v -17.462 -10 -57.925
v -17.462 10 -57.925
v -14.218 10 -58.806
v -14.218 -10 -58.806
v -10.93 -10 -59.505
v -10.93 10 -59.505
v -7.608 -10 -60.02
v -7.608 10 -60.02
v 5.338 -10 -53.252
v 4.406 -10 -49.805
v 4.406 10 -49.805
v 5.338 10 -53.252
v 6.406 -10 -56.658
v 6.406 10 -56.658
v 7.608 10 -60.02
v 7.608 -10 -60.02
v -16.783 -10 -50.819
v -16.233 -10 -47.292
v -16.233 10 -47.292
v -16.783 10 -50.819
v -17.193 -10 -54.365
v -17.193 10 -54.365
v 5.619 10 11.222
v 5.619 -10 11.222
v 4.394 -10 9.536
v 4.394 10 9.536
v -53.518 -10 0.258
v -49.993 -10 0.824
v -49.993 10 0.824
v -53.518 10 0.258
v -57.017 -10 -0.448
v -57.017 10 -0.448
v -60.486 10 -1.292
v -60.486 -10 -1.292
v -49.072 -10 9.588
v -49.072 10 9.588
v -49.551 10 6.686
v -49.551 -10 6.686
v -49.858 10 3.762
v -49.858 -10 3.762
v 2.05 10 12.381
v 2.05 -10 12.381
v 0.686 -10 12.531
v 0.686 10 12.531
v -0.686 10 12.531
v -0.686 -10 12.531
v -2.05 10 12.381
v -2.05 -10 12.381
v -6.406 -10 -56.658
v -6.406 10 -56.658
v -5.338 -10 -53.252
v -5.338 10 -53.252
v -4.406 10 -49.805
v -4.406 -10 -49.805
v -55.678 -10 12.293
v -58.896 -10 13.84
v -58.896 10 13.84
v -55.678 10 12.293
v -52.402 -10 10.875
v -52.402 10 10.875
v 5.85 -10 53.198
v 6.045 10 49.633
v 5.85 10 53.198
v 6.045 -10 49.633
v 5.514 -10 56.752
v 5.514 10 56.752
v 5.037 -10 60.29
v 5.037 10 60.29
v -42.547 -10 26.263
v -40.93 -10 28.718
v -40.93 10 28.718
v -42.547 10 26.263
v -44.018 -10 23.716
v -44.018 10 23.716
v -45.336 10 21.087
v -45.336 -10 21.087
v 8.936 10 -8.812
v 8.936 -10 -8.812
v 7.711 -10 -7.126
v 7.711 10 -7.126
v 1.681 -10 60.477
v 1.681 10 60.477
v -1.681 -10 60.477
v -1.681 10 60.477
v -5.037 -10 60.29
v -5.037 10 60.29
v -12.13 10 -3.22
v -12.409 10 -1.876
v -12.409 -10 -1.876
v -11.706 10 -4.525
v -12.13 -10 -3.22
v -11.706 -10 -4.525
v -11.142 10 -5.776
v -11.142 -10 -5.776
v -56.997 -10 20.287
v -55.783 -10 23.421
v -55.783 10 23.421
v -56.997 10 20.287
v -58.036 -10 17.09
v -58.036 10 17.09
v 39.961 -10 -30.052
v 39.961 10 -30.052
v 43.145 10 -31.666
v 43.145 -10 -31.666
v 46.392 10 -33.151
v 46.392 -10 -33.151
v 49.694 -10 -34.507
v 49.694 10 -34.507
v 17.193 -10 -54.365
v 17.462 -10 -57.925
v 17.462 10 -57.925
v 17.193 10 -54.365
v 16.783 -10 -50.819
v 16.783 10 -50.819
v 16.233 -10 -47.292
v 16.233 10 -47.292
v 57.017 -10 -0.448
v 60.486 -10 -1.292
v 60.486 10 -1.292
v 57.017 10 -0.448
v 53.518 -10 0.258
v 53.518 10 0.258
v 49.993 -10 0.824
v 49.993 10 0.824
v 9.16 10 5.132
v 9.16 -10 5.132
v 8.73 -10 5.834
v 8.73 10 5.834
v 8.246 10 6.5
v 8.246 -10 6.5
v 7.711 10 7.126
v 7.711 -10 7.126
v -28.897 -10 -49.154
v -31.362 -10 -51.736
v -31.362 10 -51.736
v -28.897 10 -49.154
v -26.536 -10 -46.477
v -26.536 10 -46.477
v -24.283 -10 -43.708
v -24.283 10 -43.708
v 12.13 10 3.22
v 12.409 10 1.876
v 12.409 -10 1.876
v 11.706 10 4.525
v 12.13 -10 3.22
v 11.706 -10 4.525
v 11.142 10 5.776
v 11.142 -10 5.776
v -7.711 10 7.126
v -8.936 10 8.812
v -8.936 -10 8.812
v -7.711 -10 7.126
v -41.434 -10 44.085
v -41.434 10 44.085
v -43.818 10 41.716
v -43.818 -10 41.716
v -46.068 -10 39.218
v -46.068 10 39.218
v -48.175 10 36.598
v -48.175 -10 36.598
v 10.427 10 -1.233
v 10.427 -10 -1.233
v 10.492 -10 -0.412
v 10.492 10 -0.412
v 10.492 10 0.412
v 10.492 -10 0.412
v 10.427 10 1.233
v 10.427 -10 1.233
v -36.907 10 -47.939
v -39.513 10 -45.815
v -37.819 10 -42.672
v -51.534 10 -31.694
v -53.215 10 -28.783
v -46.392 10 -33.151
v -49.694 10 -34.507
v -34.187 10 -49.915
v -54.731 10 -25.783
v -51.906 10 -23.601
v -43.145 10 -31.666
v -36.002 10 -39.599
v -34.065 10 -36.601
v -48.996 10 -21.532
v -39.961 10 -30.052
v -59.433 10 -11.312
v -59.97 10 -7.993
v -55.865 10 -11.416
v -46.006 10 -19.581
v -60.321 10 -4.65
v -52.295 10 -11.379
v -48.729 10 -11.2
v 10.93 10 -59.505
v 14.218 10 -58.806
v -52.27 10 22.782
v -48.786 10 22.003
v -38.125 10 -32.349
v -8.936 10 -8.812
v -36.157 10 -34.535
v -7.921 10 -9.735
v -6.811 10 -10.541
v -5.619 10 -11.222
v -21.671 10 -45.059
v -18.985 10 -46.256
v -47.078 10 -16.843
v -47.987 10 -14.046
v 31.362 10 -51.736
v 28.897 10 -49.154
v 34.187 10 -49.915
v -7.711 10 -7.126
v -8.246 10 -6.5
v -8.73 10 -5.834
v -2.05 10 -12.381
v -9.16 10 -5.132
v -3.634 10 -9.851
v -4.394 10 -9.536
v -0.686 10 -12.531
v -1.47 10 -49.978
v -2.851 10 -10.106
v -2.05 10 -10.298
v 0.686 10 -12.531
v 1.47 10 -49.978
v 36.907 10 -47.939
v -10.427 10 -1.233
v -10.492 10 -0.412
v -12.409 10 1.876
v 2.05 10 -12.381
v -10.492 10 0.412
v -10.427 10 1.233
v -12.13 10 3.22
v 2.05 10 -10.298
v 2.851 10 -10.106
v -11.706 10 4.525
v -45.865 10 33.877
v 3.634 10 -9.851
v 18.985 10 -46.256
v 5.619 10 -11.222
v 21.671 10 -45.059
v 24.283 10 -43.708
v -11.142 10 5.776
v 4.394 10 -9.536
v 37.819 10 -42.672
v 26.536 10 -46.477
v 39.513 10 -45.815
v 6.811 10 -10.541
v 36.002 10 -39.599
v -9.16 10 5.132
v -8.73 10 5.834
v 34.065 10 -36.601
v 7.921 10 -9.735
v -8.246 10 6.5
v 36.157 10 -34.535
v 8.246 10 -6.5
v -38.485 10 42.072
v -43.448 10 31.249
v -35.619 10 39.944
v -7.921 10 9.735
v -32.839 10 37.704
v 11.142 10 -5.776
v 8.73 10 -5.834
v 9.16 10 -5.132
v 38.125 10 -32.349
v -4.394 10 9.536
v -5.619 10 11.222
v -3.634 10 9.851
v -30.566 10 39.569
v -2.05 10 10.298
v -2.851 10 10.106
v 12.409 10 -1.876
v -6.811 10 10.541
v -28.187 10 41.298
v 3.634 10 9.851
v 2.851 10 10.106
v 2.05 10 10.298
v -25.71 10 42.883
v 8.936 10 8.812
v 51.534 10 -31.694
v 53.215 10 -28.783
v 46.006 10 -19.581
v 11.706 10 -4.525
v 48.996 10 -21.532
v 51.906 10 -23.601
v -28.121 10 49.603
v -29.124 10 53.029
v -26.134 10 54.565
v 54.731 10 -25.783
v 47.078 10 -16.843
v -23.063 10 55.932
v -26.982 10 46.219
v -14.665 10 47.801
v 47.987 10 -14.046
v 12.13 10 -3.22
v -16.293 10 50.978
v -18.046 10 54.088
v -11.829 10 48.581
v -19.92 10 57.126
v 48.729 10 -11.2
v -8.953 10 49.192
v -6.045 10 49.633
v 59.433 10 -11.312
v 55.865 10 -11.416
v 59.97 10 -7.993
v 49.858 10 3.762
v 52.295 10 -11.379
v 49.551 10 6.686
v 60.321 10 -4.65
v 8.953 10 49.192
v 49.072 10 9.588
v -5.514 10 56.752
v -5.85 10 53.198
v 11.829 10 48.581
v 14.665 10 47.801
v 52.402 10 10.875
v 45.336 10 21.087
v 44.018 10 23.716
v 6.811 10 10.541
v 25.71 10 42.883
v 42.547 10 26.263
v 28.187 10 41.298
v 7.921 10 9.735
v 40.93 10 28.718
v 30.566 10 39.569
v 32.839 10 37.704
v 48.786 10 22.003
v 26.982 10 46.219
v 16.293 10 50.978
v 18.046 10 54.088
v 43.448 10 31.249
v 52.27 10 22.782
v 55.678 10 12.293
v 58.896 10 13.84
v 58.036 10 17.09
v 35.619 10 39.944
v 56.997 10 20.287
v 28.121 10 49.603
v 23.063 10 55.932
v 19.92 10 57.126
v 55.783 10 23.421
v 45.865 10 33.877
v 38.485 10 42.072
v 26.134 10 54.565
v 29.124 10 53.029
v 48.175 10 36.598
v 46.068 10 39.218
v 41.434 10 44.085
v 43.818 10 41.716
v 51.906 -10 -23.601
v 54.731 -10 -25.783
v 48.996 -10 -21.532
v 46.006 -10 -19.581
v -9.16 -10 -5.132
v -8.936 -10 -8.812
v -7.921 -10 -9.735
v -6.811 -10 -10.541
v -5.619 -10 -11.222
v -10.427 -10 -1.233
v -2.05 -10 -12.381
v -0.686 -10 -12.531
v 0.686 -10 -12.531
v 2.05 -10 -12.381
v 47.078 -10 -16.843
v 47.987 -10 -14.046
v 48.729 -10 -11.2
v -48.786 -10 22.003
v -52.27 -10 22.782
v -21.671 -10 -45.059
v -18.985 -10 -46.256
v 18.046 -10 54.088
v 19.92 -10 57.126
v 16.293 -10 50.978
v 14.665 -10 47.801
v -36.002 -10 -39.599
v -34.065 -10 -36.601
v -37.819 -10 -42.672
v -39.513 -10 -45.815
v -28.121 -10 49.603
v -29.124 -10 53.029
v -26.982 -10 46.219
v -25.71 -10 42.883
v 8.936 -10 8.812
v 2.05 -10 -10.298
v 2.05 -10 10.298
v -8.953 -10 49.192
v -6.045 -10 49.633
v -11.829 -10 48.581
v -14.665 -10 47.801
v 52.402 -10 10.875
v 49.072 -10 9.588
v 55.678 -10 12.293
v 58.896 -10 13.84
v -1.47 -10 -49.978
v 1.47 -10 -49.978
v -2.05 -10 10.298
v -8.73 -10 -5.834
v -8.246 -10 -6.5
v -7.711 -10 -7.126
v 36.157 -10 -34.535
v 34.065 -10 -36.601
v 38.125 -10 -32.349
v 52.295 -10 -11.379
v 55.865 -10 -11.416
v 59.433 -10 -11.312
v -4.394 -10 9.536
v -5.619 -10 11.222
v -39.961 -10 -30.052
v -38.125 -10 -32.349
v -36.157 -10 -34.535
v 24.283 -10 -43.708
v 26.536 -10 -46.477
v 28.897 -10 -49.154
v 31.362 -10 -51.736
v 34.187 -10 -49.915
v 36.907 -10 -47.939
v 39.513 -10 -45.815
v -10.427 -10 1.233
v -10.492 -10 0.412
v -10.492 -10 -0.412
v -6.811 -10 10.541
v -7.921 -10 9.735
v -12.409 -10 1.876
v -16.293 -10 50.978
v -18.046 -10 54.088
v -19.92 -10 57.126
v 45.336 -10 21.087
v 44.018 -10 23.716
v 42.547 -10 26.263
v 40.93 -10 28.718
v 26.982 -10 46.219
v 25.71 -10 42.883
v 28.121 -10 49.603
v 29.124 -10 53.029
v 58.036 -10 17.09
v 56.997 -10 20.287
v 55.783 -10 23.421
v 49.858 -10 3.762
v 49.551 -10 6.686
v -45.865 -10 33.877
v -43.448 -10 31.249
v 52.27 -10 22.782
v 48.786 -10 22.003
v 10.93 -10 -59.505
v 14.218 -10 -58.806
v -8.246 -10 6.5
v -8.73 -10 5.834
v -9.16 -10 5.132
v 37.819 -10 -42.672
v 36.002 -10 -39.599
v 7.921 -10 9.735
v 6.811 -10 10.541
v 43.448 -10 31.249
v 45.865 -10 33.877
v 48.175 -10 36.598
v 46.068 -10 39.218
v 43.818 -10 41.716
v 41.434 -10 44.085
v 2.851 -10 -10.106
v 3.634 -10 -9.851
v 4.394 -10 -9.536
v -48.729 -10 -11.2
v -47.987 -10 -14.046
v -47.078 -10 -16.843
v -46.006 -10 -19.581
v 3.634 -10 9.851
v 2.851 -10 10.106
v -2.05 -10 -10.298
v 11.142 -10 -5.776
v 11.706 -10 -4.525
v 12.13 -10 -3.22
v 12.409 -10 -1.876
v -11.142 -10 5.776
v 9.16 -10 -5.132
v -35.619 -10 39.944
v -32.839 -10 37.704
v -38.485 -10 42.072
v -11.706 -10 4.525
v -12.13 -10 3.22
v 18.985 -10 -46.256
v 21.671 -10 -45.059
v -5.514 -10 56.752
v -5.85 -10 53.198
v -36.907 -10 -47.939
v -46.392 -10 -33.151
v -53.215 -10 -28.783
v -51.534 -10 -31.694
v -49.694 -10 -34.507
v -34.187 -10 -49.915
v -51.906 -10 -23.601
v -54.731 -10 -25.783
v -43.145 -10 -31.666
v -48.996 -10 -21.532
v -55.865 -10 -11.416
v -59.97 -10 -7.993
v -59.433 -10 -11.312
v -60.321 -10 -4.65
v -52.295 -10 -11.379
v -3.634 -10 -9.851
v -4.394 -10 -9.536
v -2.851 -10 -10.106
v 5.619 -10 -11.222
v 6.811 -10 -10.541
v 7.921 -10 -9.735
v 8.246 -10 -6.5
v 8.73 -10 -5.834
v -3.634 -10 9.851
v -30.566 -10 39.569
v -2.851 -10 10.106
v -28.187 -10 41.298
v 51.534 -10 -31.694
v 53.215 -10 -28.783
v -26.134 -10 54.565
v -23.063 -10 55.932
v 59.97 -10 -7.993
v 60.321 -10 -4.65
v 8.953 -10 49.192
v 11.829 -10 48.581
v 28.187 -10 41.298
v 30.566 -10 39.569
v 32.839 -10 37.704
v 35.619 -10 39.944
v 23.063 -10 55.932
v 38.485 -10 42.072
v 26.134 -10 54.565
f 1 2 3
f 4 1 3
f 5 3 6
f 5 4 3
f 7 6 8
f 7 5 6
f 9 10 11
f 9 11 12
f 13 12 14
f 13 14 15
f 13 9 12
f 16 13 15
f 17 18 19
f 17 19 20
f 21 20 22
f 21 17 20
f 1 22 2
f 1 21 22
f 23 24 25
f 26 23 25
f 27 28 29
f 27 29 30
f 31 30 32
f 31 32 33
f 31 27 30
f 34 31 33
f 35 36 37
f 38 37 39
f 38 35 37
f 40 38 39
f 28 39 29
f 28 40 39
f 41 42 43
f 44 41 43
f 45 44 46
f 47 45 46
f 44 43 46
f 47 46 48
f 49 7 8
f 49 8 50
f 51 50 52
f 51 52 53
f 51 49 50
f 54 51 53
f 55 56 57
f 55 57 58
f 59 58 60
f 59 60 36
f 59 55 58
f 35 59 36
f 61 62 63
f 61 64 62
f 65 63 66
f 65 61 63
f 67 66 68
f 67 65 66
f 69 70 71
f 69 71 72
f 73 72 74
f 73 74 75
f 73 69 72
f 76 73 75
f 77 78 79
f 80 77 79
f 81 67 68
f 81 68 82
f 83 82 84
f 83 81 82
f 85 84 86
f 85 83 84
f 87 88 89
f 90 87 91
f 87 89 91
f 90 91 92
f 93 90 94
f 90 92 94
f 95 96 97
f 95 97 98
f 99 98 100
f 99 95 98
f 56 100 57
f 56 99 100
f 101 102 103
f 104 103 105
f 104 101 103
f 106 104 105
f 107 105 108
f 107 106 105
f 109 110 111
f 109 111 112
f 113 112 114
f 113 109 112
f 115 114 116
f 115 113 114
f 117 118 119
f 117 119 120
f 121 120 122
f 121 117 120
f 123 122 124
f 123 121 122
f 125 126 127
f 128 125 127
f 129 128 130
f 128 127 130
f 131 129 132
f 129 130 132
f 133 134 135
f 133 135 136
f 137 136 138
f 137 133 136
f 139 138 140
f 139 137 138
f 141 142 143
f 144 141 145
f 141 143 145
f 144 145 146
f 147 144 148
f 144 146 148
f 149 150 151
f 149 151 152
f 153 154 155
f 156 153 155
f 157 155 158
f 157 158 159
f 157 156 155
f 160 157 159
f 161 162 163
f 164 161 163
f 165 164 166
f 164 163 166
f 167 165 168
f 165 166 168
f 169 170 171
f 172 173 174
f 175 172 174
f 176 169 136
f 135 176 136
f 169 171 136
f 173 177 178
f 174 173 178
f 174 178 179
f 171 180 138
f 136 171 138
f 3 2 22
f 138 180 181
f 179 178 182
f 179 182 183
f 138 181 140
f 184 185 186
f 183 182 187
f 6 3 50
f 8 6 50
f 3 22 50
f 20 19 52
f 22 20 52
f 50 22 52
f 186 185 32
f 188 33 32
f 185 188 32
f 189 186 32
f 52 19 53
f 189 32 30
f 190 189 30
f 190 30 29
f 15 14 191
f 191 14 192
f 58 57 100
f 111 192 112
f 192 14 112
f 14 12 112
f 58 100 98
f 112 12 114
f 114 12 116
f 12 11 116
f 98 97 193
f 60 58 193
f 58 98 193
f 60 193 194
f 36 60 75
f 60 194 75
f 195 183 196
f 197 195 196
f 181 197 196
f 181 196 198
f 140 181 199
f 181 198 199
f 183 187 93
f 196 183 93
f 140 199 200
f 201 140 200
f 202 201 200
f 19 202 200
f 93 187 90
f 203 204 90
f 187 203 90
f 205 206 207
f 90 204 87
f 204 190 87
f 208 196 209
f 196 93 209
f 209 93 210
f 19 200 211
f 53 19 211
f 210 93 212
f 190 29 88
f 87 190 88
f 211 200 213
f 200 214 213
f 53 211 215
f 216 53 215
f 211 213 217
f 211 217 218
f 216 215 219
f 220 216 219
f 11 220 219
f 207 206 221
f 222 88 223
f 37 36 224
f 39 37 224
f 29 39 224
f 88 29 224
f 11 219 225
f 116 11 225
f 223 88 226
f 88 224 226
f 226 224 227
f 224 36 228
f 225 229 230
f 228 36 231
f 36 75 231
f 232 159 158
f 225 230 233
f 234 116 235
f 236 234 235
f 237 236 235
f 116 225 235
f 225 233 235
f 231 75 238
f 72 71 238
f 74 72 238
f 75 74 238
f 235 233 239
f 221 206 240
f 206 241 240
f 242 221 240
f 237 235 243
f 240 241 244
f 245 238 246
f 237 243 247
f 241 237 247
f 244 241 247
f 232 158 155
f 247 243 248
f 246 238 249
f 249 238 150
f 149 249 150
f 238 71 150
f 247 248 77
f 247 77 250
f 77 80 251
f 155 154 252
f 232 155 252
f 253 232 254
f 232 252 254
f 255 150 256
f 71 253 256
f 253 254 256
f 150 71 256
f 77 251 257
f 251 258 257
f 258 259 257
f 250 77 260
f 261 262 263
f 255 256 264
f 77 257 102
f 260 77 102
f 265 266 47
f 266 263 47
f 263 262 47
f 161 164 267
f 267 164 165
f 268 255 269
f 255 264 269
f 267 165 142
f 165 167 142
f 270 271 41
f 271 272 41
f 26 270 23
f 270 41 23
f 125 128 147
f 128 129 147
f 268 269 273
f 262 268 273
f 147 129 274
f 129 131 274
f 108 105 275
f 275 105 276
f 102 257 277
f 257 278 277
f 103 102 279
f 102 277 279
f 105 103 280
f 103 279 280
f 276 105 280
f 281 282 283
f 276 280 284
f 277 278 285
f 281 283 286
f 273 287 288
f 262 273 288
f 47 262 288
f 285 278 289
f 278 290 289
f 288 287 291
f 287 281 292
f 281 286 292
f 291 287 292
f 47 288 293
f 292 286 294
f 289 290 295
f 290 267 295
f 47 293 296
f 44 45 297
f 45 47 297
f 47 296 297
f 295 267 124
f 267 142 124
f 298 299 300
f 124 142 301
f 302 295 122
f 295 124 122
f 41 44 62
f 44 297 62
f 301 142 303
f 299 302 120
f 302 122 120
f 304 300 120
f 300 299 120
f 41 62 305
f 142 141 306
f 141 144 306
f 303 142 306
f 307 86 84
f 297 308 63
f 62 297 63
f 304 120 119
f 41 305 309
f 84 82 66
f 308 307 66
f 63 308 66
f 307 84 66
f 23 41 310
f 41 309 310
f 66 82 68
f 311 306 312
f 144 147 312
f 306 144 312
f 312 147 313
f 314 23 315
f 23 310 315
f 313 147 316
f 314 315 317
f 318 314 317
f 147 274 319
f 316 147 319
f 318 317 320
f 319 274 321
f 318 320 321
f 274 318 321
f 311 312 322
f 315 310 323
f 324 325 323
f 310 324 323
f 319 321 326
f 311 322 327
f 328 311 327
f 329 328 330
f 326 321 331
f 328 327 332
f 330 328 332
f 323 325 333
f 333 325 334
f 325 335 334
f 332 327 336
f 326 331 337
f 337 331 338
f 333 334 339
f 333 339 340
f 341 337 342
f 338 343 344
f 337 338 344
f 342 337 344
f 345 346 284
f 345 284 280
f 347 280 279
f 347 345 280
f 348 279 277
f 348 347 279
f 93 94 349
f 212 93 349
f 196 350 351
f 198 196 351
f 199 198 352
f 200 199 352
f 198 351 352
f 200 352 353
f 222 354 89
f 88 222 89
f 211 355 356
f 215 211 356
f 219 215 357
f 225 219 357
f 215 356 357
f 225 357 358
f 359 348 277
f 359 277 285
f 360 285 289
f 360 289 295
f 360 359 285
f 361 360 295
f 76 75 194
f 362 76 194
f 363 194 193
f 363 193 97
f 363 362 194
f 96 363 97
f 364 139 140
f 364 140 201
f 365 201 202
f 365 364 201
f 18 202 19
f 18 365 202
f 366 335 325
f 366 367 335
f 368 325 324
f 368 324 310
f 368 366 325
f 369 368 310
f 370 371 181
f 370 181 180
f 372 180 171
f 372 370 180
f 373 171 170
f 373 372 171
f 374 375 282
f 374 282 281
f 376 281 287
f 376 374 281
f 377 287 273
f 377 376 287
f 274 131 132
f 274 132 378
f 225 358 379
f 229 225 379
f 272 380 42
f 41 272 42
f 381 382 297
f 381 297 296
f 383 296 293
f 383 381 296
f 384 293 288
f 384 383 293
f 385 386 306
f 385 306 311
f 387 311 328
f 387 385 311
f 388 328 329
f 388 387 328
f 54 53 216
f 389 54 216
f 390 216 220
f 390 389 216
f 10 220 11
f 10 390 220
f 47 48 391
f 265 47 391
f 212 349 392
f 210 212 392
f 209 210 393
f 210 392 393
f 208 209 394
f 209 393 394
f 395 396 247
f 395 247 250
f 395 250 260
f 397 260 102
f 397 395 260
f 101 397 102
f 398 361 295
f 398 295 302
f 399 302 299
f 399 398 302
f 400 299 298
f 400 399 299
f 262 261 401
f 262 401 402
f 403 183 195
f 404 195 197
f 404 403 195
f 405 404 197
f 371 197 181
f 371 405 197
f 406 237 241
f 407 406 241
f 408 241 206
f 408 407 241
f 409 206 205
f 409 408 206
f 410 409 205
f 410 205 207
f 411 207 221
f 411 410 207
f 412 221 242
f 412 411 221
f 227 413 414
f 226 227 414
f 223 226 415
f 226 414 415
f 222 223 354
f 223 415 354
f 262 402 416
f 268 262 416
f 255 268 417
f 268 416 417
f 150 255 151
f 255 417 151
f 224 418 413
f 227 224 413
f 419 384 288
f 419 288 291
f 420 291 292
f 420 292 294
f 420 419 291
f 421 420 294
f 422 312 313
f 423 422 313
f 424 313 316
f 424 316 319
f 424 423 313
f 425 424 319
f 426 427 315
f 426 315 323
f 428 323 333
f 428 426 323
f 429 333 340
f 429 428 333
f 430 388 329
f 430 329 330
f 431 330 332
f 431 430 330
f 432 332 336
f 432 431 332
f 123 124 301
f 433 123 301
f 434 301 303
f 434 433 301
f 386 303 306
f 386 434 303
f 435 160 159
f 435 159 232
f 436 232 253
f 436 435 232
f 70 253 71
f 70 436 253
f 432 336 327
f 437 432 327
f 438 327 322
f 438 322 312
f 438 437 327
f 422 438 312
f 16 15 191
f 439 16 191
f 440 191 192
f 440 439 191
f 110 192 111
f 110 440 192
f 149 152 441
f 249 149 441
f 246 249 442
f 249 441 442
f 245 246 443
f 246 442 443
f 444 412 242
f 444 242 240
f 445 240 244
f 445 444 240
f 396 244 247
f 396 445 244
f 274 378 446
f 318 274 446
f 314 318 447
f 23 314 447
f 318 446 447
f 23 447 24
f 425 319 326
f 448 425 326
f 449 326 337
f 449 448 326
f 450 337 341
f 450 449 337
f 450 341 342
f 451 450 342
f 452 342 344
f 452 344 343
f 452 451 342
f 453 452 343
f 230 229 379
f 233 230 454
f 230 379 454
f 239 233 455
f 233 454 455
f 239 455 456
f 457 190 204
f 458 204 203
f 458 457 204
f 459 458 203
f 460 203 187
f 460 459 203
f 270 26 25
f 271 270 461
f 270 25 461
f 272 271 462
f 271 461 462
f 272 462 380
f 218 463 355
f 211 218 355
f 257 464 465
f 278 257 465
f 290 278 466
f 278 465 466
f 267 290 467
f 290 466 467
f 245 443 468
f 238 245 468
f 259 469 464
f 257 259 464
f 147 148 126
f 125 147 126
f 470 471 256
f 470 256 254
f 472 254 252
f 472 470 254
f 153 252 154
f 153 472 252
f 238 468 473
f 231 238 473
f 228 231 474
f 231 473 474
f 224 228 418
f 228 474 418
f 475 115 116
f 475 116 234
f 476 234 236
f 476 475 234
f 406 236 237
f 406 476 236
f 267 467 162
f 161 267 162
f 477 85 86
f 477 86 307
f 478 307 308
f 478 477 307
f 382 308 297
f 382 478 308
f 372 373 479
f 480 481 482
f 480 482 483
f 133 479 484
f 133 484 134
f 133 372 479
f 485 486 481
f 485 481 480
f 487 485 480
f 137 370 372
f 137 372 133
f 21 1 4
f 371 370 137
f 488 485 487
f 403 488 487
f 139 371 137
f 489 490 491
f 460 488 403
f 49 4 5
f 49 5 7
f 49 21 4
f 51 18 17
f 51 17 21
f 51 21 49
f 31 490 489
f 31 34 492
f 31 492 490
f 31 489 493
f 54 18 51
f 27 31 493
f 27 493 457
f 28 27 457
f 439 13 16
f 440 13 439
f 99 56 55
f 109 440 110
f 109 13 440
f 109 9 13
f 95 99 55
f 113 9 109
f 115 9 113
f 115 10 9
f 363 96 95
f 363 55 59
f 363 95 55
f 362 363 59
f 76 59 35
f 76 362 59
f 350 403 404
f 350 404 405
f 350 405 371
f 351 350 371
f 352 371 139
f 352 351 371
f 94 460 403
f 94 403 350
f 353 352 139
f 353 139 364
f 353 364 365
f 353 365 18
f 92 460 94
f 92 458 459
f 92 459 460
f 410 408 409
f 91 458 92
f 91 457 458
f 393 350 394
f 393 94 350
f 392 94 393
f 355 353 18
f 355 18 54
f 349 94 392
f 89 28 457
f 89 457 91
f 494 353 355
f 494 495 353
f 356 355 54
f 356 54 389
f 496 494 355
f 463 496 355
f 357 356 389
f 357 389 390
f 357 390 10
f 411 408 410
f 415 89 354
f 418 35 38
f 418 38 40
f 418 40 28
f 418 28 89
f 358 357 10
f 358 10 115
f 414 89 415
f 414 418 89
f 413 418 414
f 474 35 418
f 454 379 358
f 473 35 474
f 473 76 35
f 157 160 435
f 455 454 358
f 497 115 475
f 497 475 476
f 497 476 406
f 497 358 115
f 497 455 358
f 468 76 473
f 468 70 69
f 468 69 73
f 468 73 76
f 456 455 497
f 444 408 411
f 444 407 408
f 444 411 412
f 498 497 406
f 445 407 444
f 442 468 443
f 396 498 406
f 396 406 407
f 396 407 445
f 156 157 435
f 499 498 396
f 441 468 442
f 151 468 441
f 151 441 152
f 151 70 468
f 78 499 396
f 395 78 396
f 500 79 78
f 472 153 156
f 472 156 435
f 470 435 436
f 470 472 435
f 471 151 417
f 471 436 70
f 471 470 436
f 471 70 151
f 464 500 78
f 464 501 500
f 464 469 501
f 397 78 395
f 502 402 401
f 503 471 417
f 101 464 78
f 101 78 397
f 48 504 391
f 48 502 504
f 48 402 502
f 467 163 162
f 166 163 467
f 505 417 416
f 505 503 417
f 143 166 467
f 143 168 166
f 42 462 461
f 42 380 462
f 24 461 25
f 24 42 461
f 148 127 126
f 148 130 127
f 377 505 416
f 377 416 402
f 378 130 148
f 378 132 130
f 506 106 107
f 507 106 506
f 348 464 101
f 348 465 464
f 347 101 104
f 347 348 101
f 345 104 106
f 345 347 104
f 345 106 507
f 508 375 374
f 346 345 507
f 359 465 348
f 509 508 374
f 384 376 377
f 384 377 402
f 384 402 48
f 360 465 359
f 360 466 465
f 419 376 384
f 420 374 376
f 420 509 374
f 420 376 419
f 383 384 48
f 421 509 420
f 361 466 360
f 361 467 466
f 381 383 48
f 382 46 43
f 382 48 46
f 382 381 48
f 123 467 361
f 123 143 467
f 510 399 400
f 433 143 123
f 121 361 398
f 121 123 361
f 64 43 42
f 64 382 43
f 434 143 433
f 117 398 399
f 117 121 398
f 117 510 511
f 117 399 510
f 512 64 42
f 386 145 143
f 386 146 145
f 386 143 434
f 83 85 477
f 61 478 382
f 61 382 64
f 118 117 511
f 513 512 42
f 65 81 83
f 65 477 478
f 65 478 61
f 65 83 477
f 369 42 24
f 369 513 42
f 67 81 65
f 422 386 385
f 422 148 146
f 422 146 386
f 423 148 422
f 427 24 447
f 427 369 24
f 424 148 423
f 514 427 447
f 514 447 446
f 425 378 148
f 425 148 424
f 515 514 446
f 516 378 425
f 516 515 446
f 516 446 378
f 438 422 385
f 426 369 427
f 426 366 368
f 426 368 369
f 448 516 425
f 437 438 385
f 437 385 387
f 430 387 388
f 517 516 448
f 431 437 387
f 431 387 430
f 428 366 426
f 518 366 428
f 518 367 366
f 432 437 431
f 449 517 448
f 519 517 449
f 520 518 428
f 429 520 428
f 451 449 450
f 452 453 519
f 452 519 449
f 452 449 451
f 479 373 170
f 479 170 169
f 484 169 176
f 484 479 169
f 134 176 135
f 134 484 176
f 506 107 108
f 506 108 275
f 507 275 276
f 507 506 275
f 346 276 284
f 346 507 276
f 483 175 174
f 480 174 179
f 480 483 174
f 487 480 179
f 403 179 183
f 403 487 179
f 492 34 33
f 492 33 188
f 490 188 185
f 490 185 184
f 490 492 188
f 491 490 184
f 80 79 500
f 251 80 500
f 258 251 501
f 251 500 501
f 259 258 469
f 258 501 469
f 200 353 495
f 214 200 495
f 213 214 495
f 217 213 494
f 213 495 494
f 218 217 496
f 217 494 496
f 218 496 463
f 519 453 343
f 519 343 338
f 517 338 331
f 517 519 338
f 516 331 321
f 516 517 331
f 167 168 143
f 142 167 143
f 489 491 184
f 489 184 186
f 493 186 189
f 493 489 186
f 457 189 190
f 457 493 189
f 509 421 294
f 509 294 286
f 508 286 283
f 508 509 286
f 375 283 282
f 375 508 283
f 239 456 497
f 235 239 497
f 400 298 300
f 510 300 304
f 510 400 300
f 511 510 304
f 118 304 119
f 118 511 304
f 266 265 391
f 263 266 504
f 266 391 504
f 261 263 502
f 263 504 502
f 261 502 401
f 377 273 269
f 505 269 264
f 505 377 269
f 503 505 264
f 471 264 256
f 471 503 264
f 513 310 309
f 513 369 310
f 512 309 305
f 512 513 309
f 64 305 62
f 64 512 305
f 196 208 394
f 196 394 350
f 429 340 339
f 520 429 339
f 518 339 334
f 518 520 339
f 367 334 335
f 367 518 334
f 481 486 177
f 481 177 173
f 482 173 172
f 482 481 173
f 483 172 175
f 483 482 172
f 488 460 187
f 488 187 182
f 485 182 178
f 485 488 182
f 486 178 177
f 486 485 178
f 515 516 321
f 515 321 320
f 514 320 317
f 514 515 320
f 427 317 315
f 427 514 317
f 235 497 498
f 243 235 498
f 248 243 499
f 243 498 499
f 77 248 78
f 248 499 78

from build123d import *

# Parameters (mm, degrees)
F2_DEPTH = 10
F3_DEPTH = 12.5


with BuildPart() as f2:
    # F1 (on Front) → F2 (new body, symmetric)
    with BuildSketch(Plane.XZ):
        with BuildLine():
            ThreePointArc((-6.0454455831, 49.6331803102), (0, 50), (6.0454455831, 49.6331803102))
            ThreePointArc((6.0454455831, 49.6331803102), (5.6999328162, 54.9765582241), (5.0372687356, 60.2899321917))
            ThreePointArc((5.0372687356, 60.2899321917), (0, 60.5), (-5.0372687356, 60.2899321917))
            ThreePointArc((-5.0372687356, 60.2899321917), (-5.6999328162, 54.9765582241), (-6.0454455831, 49.6331803102))
        make_face()
        with BuildLine():
            ThreePointArc((14.6648437927, 47.8010706631), (20.3368321538, 45.6772728821), (25.7104224964, 42.8832621783))
            ThreePointArc((25.7104224964, 42.8832621783), (27.5681284731, 47.905213503), (29.1238986033, 53.0287519196))
            ThreePointArc((29.1238986033, 53.0287519196), (24.6075669061, 55.2695001874), (19.9203506586, 57.1264354711))
            ThreePointArc((19.9203506586, 57.1264354711), (17.1538330068, 52.5419565819), (14.6648437927, 47.8010706631))
        make_face()
        with BuildLine():
            ThreePointArc((32.8394484508, 37.7037216393), (37.1572412739, 33.4565303179), (40.9298337882, 28.7184384337))
            ThreePointArc((40.9298337882, 28.7184384337), (44.6695442683, 32.5506221621), (48.1747418201, 36.5984186894))
            ThreePointArc((48.1747418201, 36.5984186894), (44.9602619414, 40.4824016847), (41.4335604532, 44.0852590802))
            ThreePointArc((41.4335604532, 44.0852590802), (37.0415452653, 41.022373318), (32.8394484508, 37.7037216393))
        make_face()
        with BuildLine():
            ThreePointArc((45.3358141347, 21.0870566164), (47.5528258148, 15.4508497187), (49.0721049822, 9.587935785))
            ThreePointArc((49.0721049822, 9.587935785), (54.0471900496, 11.5677325362), (58.8957345225, 13.8398863816))
            ThreePointArc((58.8957345225, 13.8398863816), (57.5389192359, 18.6955281597), (55.7825312334, 23.4213408923))
            ThreePointArc((55.7825312334, 23.4213408923), (50.5244378355, 22.4096490308), (45.3358141347, 21.0870566164))
        make_face()
        with BuildLine():
            ThreePointArc((49.9932056918, 0.8242479348), (49.9983013941, 0.4121379686), (50, 0))
            ThreePointArc((50, 0), (49.6813253191, -5.6361258444), (48.7293634187, -11.2004080646))
            ThreePointArc((48.7293634187, -11.2004080646), (54.0795856679, -11.4153231348), (59.433119675, -11.3116880129))
            ThreePointArc((59.433119675, -11.3116880129), (60.1685746698, -6.3239720277), (60.486195595, -1.2923399121))
            ThreePointArc((60.486195595, -1.2923399121), (55.2711961039, -0.077907159), (49.9932056918, 0.8242479348))
        make_face()
        with BuildLine():
            ThreePointArc((54.7312472383, -25.7825634052), (50.4610624428, -22.5519924933), (46.0063178108, -19.5810807029))
            ThreePointArc((46.0063178108, -19.5810807029), (43.3012701892, -25), (39.9608722277, -30.0520996073))
            ThreePointArc((39.9608722277, -30.0520996073), (44.7611296266, -32.4245657308), (49.6939785027, -34.5073687866))
            ThreePointArc((49.6939785027, -34.5073687866), (52.394536929, -30.25), (54.7312472383, -25.7825634052))
        make_face()
        with BuildLine():
            ThreePointArc((39.5127690163, -45.8147474582), (36.9257526611, -41.1266334471), (34.064519626, -36.6006625985))
            ThreePointArc((34.064519626, -36.6006625985), (29.3892626146, -40.4508497187), (24.2827831954, -43.7075101131))
            ThreePointArc((24.2827831954, -43.7075101131), (27.7030676308, -47.827306344), (31.3622969917, -51.7364120075))
            ThreePointArc((31.3622969917, -51.7364120075), (35.5610077637, -48.9455281597), (39.5127690163, -45.8147474582))
        make_face()
        with BuildLine():
            ThreePointArc((17.4621740692, -57.9251454618), (17.0056447843, -52.5901058542), (16.2326565314, -47.2916574242))
            ThreePointArc((16.2326565314, -47.2916574242), (10.3955845409, -48.9073800367), (4.4059803465, -49.8054950501))
            ThreePointArc((4.4059803465, -49.8054950501), (5.8548935672, -54.9602711929), (7.6077894133, -60.0197595817))
            ThreePointArc((7.6077894133, -60.0197595817), (12.5786572945, -59.1779298444), (17.4621740692, -57.9251454618))
        make_face()
        with BuildLine():
            ThreePointArc((-7.6077894133, -60.0197595817), (-5.8548935672, -54.9602711929), (-4.4059803465, -49.8054950501))
            ThreePointArc((-4.4059803465, -49.8054950501), (-10.3955845409, -48.9073800367), (-16.2326565314, -47.2916574242))
            ThreePointArc((-16.2326565314, -47.2916574242), (-17.0056447843, -52.5901058542), (-17.4621740692, -57.9251454618))
            ThreePointArc((-17.4621740692, -57.9251454618), (-12.5786572945, -59.1779298444), (-7.6077894133, -60.0197595817))
        make_face()
        with BuildLine():
            ThreePointArc((-31.3622969917, -51.7364120075), (-27.7030676308, -47.827306344), (-24.2827831954, -43.7075101131))
            ThreePointArc((-24.2827831954, -43.7075101131), (-29.3892626146, -40.4508497187), (-34.064519626, -36.6006625985))
            ThreePointArc((-34.064519626, -36.6006625985), (-36.9257526611, -41.1266334471), (-39.5127690163, -45.8147474582))
            ThreePointArc((-39.5127690164, -45.8147474582), (-35.5610077637, -48.9455281597), (-31.3622969917, -51.7364120075))
        make_face()
        with BuildLine():
            ThreePointArc((-49.6939785027, -34.5073687866), (-44.7611296266, -32.4245657308), (-39.9608722277, -30.0520996073))
            ThreePointArc((-39.9608722277, -30.0520996073), (-43.3012701892, -25), (-46.0063178108, -19.5810807029))
            ThreePointArc((-46.0063178108, -19.5810807029), (-50.4610624428, -22.5519924933), (-54.7312472383, -25.7825634052))
            ThreePointArc((-54.7312472383, -25.7825634052), (-52.394536929, -30.25), (-49.6939785027, -34.5073687866))
        make_face()
        with BuildLine():
            ThreePointArc((-59.433119675, -11.3116880129), (-54.0795856679, -11.4153231348), (-48.7293634187, -11.2004080646))
            ThreePointArc((-48.7293634187, -11.2004080646), (-49.7260947684, -5.2264231634), (-49.9932056918, 0.8242479348))
            ThreePointArc((-49.9932056918, 0.8242479348), (-55.2711961039, -0.077907159), (-60.486195595, -1.2923399121))
            ThreePointArc((-60.486195595, -1.2923399121), (-60.1685746698, -6.3239720277), (-59.433119675, -11.3116880129))
        make_face()
        with BuildLine():
            ThreePointArc((-49.0721049822, 9.587935785), (-47.5528258148, 15.4508497187), (-45.3358141347, 21.0870566164))
            ThreePointArc((-45.3358141347, 21.0870566164), (-50.5244378355, 22.4096490308), (-55.7825312334, 23.4213408923))
            ThreePointArc((-55.7825312334, 23.4213408923), (-57.5389192359, 18.6955281597), (-58.8957345225, 13.8398863816))
            ThreePointArc((-58.8957345225, 13.8398863816), (-54.0471900496, 11.5677325362), (-49.0721049822, 9.587935785))
        make_face()
        with BuildLine():
            ThreePointArc((-25.7104224964, 42.8832621783), (-20.3368321538, 45.6772728821), (-14.6648437927, 47.8010706631))
            ThreePointArc((-14.6648437927, 47.8010706631), (-17.1538330068, 52.5419565819), (-19.9203506586, 57.1264354711))
            ThreePointArc((-19.9203506586, 57.1264354711), (-24.6075669061, 55.2695001874), (-29.1238986033, 53.0287519196))
            ThreePointArc((-29.1238986033, 53.0287519196), (-27.5681284731, 47.905213503), (-25.7104224964, 42.8832621783))
        make_face()
        with BuildLine():
            ThreePointArc((48.7293634187, -11.2004080646), (49.6813253191, -5.6361258444), (50, 0))
            ThreePointArc((50, 0), (49.9983013941, 0.4121379686), (49.9932056918, 0.8242479348))
            ThreePointArc((49.9932056918, 0.8242479348), (49.7260947684, 5.2264231634), (49.0721049822, 9.587935785))
            ThreePointArc((49.0721049822, 9.587935785), (47.5528258148, 15.4508497187), (45.3358141347, 21.0870566164))
            ThreePointArc((45.3358141347, 21.0870566164), (43.3012701892, 25), (40.9298337882, 28.7184384337))
            ThreePointArc((40.9298337882, 28.7184384337), (37.1572412739, 33.4565303179), (32.8394484508, 37.7037216393))
            ThreePointArc((32.8394484508, 37.7037216393), (29.3892626146, 40.4508497187), (25.7104224964, 42.8832621783))
            ThreePointArc((25.7104224964, 42.8832621783), (20.3368321538, 45.6772728821), (14.6648437927, 47.8010706631))
            ThreePointArc((14.6648437927, 47.8010706631), (10.3955845409, 48.9073800367), (6.0454455831, 49.6331803102))
            ThreePointArc((6.0454455831, 49.6331803102), (0, 50), (-6.0454455831, 49.6331803102))
            ThreePointArc((-6.0454455831, 49.6331803102), (-10.3955845409, 48.9073800367), (-14.6648437927, 47.8010706631))
            ThreePointArc((-14.6648437927, 47.8010706631), (-20.3368321538, 45.6772728821), (-25.7104224964, 42.8832621783))
            ThreePointArc((-25.7104224964, 42.8832621783), (-29.3892626146, 40.4508497187), (-32.8394484508, 37.7037216393))
            ThreePointArc((-32.8394484508, 37.7037216393), (-37.1572412739, 33.4565303179), (-40.9298337882, 28.7184384337))
            ThreePointArc((-40.9298337882, 28.7184384337), (-43.3012701892, 25), (-45.3358141347, 21.0870566164))
            ThreePointArc((-45.3358141347, 21.0870566164), (-47.5528258148, 15.4508497187), (-49.0721049822, 9.587935785))
            ThreePointArc((-49.0721049822, 9.587935785), (-49.7260947684, 5.2264231634), (-49.9932056918, 0.8242479348))
            ThreePointArc((-49.9932056918, 0.8242479348), (-49.7260947684, -5.2264231634), (-48.7293634187, -11.2004080646))
            ThreePointArc((-48.7293634187, -11.2004080646), (-47.5528258148, -15.4508497187), (-46.0063178108, -19.5810807029))
            ThreePointArc((-46.0063178108, -19.5810807029), (-43.3012701892, -25), (-39.9608722277, -30.0520996073))
            ThreePointArc((-39.9608722277, -30.0520996073), (-37.1572412739, -33.4565303179), (-34.064519626, -36.6006625985))
            ThreePointArc((-34.064519626, -36.6006625985), (-29.3892626146, -40.4508497187), (-24.2827831954, -43.7075101131))
            ThreePointArc((-24.2827831954, -43.7075101131), (-20.3368321538, -45.6772728821), (-16.2326565314, -47.2916574242))
            ThreePointArc((-16.2326565314, -47.2916574242), (-10.3955845409, -48.9073800367), (-4.4059803465, -49.8054950501))
            ThreePointArc((-4.4059803465, -49.8054950501), (0, -50), (4.4059803465, -49.8054950501))
            ThreePointArc((4.4059803465, -49.8054950501), (10.3955845409, -48.9073800367), (16.2326565314, -47.2916574242))
            ThreePointArc((16.2326565314, -47.2916574242), (20.3368321538, -45.6772728821), (24.2827831954, -43.7075101131))
            ThreePointArc((24.2827831954, -43.7075101131), (29.3892626146, -40.4508497187), (34.064519626, -36.6006625985))
            ThreePointArc((34.064519626, -36.6006625985), (37.1572412739, -33.4565303179), (39.9608722277, -30.0520996073))
            ThreePointArc((39.9608722277, -30.0520996073), (43.3012701892, -25), (46.0063178108, -19.5810807029))
            ThreePointArc((46.0063178108, -19.5810807029), (47.5528258148, -15.4508497187), (48.7293634187, -11.2004080646))
        make_face()
        with BuildLine():
            ThreePointArc((-40.9298337882, 28.7184384337), (-37.1572412739, 33.4565303179), (-32.8394484508, 37.7037216393))
            ThreePointArc((-32.8394484508, 37.7037216393), (-37.0415452653, 41.022373318), (-41.4335604532, 44.0852590802))
            ThreePointArc((-41.4335604532, 44.0852590802), (-44.9602619414, 40.4824016847), (-48.1747418201, 36.5984186894))
            ThreePointArc((-48.1747418201, 36.5984186894), (-44.6695442683, 32.5506221621), (-40.9298337882, 28.7184384337))
        make_face()
    extrude(amount=F2_DEPTH, both=True)

    # F0 (on Front) → F3 (cut, symmetric)
    with BuildSketch(Plane.XZ):
        with BuildLine():
            ThreePointArc((10.4274046286, -1.2325715847), (10.4818354452, -0.6173537882), (10.5, 0))
            ThreePointArc((10.5, 0), (10.4818354452, 0.6173537882), (10.4274046286, 1.2325715847))
            ThreePointArc((10.4274046286, 1.2325715847), (9.9860934211, 3.2446784409), (9.1604349517, 5.1319033015))
            ThreePointArc((9.1604349517, 5.1319033015), (8.4946784409, 6.1717451491), (7.7114601519, 7.1262460192))
            ThreePointArc((7.7114601519, 7.1262460192), (6.1717451491, 8.4946784409), (4.3944904749, 9.5361655536))
            ThreePointArc((4.3944904749, 9.5361655536), (3.2446784409, 9.9860934211), (2.05, 10.2979366865))
            ThreePointArc((2.05, 10.2979366865), (0, 10.5), (-2.05, 10.2979366865))
            ThreePointArc((-2.05, 10.2979366865), (-3.2446784409, 9.9860934211), (-4.3944904749, 9.5361655536))
            ThreePointArc((-4.3944904749, 9.5361655536), (-6.1717451491, 8.4946784409), (-7.7114601519, 7.1262460192))
            ThreePointArc((-7.7114601519, 7.1262460192), (-8.4946784409, 6.1717451491), (-9.1604349517, 5.1319033015))
            ThreePointArc((-9.1604349517, 5.1319033015), (-9.9860934211, 3.2446784409), (-10.4274046286, 1.2325715847))
            ThreePointArc((-10.4274046286, 1.2325715847), (-10.5, 0), (-10.4274046286, -1.2325715847))
            ThreePointArc((-10.4274046286, -1.2325715847), (-9.9860934211, -3.2446784409), (-9.1604349517, -5.1319033015))
            ThreePointArc((-9.1604349517, -5.1319033015), (-8.4946784409, -6.1717451491), (-7.7114601519, -7.1262460192))
            ThreePointArc((-7.7114601519, -7.1262460192), (-6.1717451491, -8.4946784409), (-4.3944904749, -9.5361655536))
            ThreePointArc((-4.3944904749, -9.5361655536), (-3.2446784409, -9.9860934211), (-2.05, -10.2979366865))
            ThreePointArc((-2.05, -10.2979366865), (0, -10.5), (2.05, -10.2979366865))
            ThreePointArc((2.05, -10.2979366865), (3.2446784409, -9.9860934211), (4.3944904749, -9.5361655536))
            ThreePointArc((4.3944904749, -9.5361655536), (6.1717451491, -8.4946784409), (7.7114601519, -7.1262460192))
            ThreePointArc((7.7114601519, -7.1262460192), (8.4946784409, -6.1717451491), (9.1604349517, -5.1319033015))
            ThreePointArc((9.1604349517, -5.1319033015), (9.9860934211, -3.2446784409), (10.4274046286, -1.2325715847))
        make_face()
        with BuildLine():
            ThreePointArc((9.1604349517, 5.1319033015), (9.9860934211, 3.2446784409), (10.4274046286, 1.2325715847))
            Line((10.4274046286, 1.2325715847), (12.4089318626, 1.8764088117))
            ThreePointArc((12.4089318626, 1.8764088117), (11.9357592795, 3.8781632794), (11.1419621857, 5.7757405285))
            Line((11.1419621857, 5.7757405285), (9.1604349517, 5.1319033015))
        make_face()
        with BuildLine():
            Line((12.4089318626, -1.8764088117), (10.4274046286, -1.2325715847))
            ThreePointArc((10.4274046286, -1.2325715847), (9.9860934211, -3.2446784409), (9.1604349517, -5.1319033015))
            Line((9.1604349517, -5.1319033015), (11.1419621857, -5.7757405285))
            ThreePointArc((11.1419621857, -5.7757405285), (11.9357592795, -3.8781632794), (12.4089318626, -1.8764088117))
        make_face()
        with BuildLine():
            ThreePointArc((4.3944904749, 9.5361655536), (6.1717451491, 8.4946784409), (7.7114601519, 7.1262460192))
            Line((7.7114601519, 7.1262460192), (8.9361113321, 8.8118337626))
            ThreePointArc((8.9361113321, 8.8118337626), (7.3767049163, 10.1531632794), (5.6191416552, 11.221753297))
            Line((5.6191416552, 11.221753297), (4.3944904749, 9.5361655536))
        make_face()
        with BuildLine():
            Line((8.9361113321, -8.8118337626), (7.7114601519, -7.1262460192))
            ThreePointArc((7.7114601519, -7.1262460192), (6.1717451491, -8.4946784409), (4.3944904749, -9.5361655536))
            Line((4.3944904749, -9.5361655536), (5.6191416552, -11.221753297))
            ThreePointArc((5.6191416552, -11.221753297), (7.3767049163, -10.1531632794), (8.9361113321, -8.8118337626))
        make_face()
        with BuildLine():
            ThreePointArc((-2.05, 10.2979366865), (0, 10.5), (2.05, 10.2979366865))
            Line((2.05, 10.2979366865), (2.05, 12.3814377194))
            ThreePointArc((2.05, 12.3814377194), (0, 12.55), (-2.05, 12.3814377194))
            Line((-2.05, 12.3814377194), (-2.05, 10.2979366865))
        make_face()
        with BuildLine():
            Line((2.05, -12.3814377194), (2.05, -10.2979366865))
            ThreePointArc((2.05, -10.2979366865), (0, -10.5), (-2.05, -10.2979366865))
            Line((-2.05, -10.2979366865), (-2.05, -12.3814377194))
            ThreePointArc((-2.05, -12.3814377194), (0, -12.55), (2.05, -12.3814377194))
        make_face()
        with BuildLine():
            ThreePointArc((-7.7114601519, 7.1262460192), (-6.1717451491, 8.4946784409), (-4.3944904749, 9.5361655536))
            Line((-4.3944904749, 9.5361655536), (-5.6191416552, 11.221753297))
            ThreePointArc((-5.6191416552, 11.221753297), (-7.3767049163, 10.1531632794), (-8.9361113321, 8.8118337626))
            Line((-8.9361113321, 8.8118337626), (-7.7114601519, 7.1262460192))
        make_face()
        with BuildLine():
            Line((-5.6191416552, -11.221753297), (-4.3944904749, -9.5361655536))
            ThreePointArc((-4.3944904749, -9.5361655536), (-6.1717451491, -8.4946784409), (-7.7114601519, -7.1262460192))
            Line((-7.7114601519, -7.1262460192), (-8.9361113321, -8.8118337626))
            ThreePointArc((-8.9361113321, -8.8118337626), (-7.3767049163, -10.1531632794), (-5.6191416552, -11.221753297))
        make_face()
        with BuildLine():
            ThreePointArc((-10.4274046286, 1.2325715847), (-9.9860934211, 3.2446784409), (-9.1604349517, 5.1319033015))
            Line((-9.1604349517, 5.1319033015), (-11.1419621857, 5.7757405285))
            ThreePointArc((-11.1419621857, 5.7757405285), (-11.9357592795, 3.8781632794), (-12.4089318626, 1.8764088117))
            Line((-12.4089318626, 1.8764088117), (-10.4274046286, 1.2325715847))
        make_face()
        with BuildLine():
            Line((-11.1419621857, -5.7757405285), (-9.1604349517, -5.1319033015))
            ThreePointArc((-9.1604349517, -5.1319033015), (-9.9860934211, -3.2446784409), (-10.4274046286, -1.2325715847))
            Line((-10.4274046286, -1.2325715847), (-12.4089318626, -1.8764088117))
            ThreePointArc((-12.4089318626, -1.8764088117), (-11.9357592795, -3.8781632794), (-11.1419621857, -5.7757405285))
        make_face()
    extrude(amount=F3_DEPTH, both=True, mode=Mode.SUBTRACT)


solid = f2.part
